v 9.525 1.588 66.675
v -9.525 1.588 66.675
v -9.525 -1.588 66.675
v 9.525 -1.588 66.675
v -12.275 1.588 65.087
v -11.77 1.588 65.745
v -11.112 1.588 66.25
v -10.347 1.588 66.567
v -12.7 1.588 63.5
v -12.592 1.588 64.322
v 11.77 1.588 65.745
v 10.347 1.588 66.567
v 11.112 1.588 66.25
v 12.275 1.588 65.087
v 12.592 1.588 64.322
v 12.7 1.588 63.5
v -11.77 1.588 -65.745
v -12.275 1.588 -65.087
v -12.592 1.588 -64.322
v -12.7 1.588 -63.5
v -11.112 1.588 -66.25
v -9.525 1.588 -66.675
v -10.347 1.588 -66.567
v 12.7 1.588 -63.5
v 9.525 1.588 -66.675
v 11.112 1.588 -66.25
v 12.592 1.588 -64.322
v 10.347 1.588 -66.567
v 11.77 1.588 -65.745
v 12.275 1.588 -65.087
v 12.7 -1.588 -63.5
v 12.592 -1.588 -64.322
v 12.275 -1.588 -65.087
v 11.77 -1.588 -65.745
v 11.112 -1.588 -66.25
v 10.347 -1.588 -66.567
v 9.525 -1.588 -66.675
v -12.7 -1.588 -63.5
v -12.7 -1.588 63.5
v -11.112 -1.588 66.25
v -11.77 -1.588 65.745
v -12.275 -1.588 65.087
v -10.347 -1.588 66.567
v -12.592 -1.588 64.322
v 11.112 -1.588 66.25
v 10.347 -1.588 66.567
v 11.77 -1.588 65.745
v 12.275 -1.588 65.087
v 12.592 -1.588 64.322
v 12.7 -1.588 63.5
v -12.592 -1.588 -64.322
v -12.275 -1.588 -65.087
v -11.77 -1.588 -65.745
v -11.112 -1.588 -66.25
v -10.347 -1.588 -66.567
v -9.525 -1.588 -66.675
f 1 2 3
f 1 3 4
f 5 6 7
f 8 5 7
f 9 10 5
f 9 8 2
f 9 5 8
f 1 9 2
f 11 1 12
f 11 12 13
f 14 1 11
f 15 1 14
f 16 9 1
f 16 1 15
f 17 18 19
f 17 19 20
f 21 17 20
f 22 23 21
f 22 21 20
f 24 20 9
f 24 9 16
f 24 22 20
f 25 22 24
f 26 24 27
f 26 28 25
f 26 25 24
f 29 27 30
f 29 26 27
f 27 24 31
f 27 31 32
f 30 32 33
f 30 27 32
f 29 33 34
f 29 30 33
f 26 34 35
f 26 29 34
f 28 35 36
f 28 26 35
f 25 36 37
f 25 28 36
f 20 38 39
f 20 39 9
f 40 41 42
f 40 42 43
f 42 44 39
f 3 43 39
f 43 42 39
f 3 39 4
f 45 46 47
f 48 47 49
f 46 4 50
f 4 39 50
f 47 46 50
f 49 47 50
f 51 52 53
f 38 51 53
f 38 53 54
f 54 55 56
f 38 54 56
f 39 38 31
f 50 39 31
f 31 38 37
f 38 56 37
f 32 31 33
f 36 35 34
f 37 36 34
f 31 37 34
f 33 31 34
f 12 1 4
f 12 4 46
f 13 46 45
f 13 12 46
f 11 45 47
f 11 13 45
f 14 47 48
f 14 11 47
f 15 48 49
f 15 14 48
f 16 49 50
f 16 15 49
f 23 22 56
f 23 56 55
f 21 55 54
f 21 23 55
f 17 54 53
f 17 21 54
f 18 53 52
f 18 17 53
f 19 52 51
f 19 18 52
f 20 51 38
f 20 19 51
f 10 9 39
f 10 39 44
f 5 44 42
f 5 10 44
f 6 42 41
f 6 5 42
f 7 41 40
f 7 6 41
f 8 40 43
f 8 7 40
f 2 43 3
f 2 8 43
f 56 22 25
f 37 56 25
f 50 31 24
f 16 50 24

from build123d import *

# Parameters (mm, degrees)
BOSS_EXTRUDE1_DEPTH      = 66.675
BOSS_EXTRUDE1_DEPTH_BACK = 66.675
SKETCH3_W                = 25.4
SKETCH3_H                = 3.175
SKETCH4_OUTSIDE_W        = 54.556
SKETCH4_OUTSIDE_H        = 162.506
CUT_EXTRUDE1_DEPTH       = 68.947967225


with BuildPart() as part:
    # Sketch3 → Boss-Extrude1 (new, two sides: drawn at the far end of the back side and taken through both)
    with BuildSketch(Plane.XY.offset(-BOSS_EXTRUDE1_DEPTH_BACK)):
        Rectangle(SKETCH3_W, SKETCH3_H)
    extrude(amount=BOSS_EXTRUDE1_DEPTH + BOSS_EXTRUDE1_DEPTH_BACK)

    # Sketch4 outside → Cut-Extrude1 (cut, through all)
    with BuildSketch(Plane(origin=(0, 1.5875, 0), x_dir=(1, 0, 0), z_dir=(0, 1, 0))):
        Rectangle(SKETCH4_OUTSIDE_W, SKETCH4_OUTSIDE_H)
        with BuildLine():
            Line((12.7, -63.5), (12.7, 63.5))
            ThreePointArc((12.7, 63.5), (11.77006403, 65.74506403), (9.525, 66.675))
            Line((9.525, 66.675), (-9.525, 66.675))
            ThreePointArc((-9.525, 66.675), (-11.77006403, 65.74506403), (-12.7, 63.5))
            Line((-12.7, 63.5), (-12.7, -63.5))
            ThreePointArc((-12.7, -63.5), (-11.77006403, -65.74506403), (-9.525, -66.675))
            Line((-9.525, -66.675), (9.525, -66.675))
            ThreePointArc((9.525, -66.675), (11.77006403, -65.74506403), (12.7, -63.5))
        make_face(mode=Mode.SUBTRACT)
    extrude(amount=-CUT_EXTRUDE1_DEPTH, mode=Mode.SUBTRACT)


solid = part.part
